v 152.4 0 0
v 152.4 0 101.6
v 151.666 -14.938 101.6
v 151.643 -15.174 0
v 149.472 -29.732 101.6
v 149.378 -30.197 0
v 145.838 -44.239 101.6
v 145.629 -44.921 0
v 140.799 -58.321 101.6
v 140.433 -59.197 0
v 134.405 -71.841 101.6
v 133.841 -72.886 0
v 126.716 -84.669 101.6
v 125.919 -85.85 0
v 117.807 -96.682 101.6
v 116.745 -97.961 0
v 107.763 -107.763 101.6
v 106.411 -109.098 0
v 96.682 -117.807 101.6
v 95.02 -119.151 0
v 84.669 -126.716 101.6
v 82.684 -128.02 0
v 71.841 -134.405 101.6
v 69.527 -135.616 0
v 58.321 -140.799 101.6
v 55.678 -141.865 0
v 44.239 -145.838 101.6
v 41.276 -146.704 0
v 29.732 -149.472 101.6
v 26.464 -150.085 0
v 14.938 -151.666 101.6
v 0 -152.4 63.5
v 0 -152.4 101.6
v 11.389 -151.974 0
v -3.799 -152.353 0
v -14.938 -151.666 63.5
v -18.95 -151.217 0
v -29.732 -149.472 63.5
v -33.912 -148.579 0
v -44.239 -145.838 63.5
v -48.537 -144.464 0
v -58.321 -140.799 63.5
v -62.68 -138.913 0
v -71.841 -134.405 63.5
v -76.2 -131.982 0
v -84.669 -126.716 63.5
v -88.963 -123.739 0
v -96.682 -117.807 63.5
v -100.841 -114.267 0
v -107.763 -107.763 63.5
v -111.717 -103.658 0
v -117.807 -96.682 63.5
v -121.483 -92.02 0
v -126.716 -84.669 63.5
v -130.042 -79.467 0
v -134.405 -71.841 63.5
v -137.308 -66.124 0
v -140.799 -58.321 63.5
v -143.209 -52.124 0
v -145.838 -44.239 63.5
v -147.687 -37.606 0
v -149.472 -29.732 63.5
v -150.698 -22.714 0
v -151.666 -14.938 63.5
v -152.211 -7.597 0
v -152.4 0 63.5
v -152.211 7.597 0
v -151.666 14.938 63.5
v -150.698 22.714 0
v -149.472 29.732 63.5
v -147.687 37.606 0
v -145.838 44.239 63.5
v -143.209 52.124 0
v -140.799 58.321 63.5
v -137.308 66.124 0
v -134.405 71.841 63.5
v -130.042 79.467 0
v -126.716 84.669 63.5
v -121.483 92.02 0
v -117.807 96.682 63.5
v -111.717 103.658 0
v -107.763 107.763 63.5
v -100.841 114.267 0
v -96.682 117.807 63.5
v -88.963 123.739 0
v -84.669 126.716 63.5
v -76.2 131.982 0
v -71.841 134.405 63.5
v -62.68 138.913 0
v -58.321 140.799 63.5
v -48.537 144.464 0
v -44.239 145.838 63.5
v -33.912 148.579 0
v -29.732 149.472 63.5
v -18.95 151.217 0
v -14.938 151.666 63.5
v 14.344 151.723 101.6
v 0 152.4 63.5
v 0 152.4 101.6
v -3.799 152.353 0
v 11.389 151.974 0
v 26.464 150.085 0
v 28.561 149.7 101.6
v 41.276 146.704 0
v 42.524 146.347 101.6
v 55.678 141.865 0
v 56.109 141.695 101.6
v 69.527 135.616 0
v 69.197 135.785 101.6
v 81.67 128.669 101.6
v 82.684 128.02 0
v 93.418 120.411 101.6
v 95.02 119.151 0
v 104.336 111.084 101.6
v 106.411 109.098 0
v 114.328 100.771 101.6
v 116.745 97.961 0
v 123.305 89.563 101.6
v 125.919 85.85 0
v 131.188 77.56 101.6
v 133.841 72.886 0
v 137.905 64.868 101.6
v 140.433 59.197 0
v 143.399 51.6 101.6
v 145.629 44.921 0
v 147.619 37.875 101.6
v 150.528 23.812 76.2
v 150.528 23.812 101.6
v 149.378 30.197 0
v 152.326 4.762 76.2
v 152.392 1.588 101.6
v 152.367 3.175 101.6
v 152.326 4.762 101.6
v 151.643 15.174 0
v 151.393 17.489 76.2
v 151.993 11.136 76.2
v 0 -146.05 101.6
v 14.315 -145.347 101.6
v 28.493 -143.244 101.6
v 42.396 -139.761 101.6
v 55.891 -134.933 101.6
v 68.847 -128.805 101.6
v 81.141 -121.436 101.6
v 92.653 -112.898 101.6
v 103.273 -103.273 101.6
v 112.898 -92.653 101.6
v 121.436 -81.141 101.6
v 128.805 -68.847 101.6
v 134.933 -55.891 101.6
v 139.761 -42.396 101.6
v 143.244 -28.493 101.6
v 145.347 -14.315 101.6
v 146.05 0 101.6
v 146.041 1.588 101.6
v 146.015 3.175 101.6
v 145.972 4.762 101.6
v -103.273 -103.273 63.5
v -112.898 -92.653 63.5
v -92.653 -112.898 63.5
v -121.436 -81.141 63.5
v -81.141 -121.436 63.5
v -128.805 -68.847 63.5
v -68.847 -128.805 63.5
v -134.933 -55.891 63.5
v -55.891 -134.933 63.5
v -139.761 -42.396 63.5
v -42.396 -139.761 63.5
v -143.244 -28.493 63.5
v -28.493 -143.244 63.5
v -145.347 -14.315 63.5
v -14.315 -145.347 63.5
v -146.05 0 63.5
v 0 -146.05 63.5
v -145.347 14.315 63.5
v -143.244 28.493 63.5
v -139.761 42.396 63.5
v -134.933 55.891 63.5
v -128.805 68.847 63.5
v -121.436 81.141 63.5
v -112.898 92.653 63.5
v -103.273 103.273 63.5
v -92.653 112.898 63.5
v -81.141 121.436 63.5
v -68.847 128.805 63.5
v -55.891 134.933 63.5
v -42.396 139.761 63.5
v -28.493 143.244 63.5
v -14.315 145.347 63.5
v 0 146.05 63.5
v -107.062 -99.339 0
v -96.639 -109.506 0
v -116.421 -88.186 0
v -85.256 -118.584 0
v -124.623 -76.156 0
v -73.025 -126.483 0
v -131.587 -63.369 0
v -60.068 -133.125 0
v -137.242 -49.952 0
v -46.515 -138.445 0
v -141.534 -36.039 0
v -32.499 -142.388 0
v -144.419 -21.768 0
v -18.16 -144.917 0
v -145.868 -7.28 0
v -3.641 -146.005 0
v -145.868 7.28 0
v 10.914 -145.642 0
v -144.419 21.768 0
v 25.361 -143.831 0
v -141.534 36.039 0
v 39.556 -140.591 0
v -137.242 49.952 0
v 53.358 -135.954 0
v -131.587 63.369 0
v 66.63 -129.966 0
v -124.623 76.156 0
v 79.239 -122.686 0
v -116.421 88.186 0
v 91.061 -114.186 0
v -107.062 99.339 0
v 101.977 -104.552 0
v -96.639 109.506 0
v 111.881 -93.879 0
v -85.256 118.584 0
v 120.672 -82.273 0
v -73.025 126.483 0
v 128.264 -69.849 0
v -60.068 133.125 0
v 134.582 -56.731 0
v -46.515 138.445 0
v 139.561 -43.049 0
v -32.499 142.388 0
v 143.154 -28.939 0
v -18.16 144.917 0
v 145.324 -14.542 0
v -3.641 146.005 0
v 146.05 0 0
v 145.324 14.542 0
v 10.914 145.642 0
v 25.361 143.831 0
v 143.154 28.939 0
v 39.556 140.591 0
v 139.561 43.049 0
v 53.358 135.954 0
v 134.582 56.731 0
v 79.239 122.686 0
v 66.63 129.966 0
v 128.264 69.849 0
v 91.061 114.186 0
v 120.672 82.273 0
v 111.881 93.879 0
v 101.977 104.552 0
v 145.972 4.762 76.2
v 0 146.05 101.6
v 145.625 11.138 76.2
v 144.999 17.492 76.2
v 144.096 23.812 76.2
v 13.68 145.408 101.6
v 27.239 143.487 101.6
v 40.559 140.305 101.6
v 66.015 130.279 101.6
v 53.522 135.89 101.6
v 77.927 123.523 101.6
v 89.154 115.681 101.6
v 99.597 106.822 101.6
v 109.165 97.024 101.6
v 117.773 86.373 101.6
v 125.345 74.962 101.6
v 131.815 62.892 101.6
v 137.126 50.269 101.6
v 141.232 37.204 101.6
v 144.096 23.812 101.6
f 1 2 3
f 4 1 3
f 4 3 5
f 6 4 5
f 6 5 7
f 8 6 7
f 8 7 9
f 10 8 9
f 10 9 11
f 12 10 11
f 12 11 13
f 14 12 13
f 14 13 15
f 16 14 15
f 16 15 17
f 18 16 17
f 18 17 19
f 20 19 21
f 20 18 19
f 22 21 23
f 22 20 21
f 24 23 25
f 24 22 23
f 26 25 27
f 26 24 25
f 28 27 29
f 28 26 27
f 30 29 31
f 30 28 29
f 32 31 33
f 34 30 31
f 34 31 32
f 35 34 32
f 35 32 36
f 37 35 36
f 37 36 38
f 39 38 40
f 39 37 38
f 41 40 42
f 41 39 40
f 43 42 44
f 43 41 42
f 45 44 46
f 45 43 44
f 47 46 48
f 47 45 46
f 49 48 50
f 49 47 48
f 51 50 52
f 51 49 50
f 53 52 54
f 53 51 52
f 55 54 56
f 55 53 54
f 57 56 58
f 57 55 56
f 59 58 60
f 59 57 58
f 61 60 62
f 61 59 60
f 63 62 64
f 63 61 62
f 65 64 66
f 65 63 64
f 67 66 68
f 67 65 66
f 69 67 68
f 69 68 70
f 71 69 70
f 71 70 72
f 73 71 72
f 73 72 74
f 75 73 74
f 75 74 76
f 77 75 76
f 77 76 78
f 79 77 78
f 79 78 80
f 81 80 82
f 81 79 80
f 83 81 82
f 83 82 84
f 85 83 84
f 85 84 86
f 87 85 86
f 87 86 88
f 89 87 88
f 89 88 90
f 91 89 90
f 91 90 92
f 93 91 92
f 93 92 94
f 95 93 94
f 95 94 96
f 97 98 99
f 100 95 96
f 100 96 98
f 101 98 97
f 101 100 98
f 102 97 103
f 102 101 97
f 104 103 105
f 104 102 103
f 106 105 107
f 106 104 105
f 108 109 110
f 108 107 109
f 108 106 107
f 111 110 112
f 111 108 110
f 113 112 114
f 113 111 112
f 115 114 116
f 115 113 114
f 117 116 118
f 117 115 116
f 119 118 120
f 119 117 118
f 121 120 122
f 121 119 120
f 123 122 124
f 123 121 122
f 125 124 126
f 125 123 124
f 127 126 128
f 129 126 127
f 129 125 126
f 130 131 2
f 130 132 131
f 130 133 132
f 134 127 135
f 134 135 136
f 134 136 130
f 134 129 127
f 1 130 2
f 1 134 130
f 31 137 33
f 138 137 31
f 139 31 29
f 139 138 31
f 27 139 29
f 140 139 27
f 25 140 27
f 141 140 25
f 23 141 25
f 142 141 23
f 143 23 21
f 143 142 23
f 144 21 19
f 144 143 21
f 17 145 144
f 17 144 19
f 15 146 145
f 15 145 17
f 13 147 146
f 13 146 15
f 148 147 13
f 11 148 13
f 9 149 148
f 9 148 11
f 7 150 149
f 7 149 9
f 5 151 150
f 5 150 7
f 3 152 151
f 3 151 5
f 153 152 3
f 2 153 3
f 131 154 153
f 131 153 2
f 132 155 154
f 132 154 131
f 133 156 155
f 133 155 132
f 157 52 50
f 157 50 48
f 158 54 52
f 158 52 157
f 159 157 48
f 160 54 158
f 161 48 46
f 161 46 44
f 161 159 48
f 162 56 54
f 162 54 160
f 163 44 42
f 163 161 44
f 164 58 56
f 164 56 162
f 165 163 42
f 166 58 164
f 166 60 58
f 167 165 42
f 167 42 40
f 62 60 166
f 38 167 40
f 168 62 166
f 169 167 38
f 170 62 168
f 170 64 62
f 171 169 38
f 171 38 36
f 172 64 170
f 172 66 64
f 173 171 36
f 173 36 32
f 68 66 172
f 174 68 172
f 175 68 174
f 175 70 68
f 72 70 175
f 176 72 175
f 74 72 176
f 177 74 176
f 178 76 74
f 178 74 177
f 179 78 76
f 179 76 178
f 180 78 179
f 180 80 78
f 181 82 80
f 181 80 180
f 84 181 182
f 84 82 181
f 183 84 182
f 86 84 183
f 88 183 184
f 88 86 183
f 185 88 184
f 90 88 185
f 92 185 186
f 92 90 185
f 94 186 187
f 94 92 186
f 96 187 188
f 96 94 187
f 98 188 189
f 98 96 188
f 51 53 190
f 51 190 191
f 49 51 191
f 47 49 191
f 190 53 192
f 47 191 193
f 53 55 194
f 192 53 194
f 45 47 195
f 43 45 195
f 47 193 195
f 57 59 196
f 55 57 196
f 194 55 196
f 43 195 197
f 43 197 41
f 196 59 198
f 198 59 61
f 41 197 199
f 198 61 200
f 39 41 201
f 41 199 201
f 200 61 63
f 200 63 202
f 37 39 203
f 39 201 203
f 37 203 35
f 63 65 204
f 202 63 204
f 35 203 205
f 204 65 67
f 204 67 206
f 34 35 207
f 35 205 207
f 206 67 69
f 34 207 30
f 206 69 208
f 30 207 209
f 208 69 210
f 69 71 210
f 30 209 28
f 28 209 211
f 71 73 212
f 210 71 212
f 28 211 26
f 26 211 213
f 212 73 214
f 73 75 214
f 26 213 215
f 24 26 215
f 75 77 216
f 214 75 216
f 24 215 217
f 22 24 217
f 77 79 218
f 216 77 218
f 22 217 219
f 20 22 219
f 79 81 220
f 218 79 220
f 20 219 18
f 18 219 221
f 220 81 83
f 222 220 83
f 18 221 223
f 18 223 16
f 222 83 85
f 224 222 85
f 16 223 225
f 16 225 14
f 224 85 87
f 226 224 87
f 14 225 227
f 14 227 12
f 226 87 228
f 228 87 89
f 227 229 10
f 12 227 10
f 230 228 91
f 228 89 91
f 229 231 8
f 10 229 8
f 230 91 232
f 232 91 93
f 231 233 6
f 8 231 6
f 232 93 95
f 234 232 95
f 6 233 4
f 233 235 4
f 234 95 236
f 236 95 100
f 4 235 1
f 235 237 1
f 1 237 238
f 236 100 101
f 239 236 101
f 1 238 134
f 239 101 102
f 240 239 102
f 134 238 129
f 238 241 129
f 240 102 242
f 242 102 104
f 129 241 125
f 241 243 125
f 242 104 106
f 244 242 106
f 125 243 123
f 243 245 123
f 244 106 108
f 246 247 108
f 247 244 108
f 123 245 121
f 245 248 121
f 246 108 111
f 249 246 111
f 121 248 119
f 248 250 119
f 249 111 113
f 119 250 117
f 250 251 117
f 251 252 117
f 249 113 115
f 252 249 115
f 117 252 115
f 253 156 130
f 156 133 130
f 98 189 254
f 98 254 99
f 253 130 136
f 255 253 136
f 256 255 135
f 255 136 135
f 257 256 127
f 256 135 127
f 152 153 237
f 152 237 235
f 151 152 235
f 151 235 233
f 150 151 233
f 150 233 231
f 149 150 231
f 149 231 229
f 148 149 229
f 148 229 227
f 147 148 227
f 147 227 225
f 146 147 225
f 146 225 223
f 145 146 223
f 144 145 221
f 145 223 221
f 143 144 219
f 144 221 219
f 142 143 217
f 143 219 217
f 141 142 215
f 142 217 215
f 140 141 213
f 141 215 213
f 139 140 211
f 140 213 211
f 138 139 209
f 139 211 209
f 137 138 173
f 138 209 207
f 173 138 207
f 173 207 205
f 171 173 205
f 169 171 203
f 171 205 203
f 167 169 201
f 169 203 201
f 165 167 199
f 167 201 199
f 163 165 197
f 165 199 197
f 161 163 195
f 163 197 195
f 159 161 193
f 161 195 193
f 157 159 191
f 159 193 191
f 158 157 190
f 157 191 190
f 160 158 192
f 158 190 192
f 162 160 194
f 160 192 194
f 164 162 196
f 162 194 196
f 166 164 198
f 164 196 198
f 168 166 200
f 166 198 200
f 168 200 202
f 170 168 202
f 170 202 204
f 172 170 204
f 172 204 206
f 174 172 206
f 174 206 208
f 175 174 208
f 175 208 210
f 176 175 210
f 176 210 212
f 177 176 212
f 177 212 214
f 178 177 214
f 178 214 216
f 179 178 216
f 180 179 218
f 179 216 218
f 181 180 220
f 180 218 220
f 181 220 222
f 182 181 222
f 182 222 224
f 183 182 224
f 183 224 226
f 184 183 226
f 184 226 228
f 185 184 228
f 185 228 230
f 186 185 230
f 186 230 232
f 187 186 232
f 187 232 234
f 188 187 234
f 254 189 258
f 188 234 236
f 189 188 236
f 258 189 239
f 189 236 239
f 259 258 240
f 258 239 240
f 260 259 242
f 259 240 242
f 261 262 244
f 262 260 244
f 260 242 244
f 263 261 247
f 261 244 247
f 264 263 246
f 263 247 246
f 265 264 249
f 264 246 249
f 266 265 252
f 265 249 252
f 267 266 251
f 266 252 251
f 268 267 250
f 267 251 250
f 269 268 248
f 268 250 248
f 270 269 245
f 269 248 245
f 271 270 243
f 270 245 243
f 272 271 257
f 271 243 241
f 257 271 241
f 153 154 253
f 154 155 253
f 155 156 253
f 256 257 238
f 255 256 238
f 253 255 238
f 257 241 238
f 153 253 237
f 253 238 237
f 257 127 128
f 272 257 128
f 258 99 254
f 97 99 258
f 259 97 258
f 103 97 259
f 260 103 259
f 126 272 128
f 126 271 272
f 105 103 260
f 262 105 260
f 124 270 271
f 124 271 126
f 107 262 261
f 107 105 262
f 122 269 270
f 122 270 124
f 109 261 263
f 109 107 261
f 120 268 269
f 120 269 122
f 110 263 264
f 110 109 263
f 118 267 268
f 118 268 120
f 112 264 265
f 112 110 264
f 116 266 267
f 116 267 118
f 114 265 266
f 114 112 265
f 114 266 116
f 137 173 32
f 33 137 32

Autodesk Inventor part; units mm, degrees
ref_plane "YZ Plane" through (0, 0, 0) normal (1, 0, 0) x (0, 1, 0)
ref_plane "XZ Plane" through (0, 0, 0) normal (0, 1, 0) x (-1, 0, 0)
ref_plane "XY Plane" through (0, 0, 0) normal (0, 0, 1) x (1, 0, 0)
sketch "Sketch1" plane through (0, 0, 0) normal (0, 0, 1) x (1, 0, 0)
  circle A0 centre (0, 0) radius 152.4
  circle A1 centre (0, 0) radius 146.05
  dimension "d0" = 304.8
  dimension "d1" = 292.1
extrude "Extrusion1" add sketch "Sketch1" along normal blind 101.6
sketch "Sketch2" plane through (0, 0, 101.6) normal (0, 0, 1) x (1, 0, 0)
  circle A0 centre (0, 0) radius 146.05 projected
  circle A1 centre (0, 0) radius 152.4 projected
  line L0 (0, -146.05) -> (0, -152.4)
  line L1 (0, 146.05) -> (0, 152.4)
extrude "Extrusion3" cut sketch "Sketch2" against normal blind 38.1 contours A0 L0 A1 L1 picked at (-148.0019, 0)
ref_plane "Work Plane1" through (152.4, 0, 0) normal (-1, 0, 0) x (0, -1, 0)
sketch "Sketch3" plane through (152.4, 0, 0) normal (-1, 0, 0) x (0, -1, 0)
  line L0 (-4.7625, 101.6) -> (-4.7625, 76.2)
  line L1 (-4.7625, 76.2) -> (-23.8125, 76.2)
  line L2 (-23.8125, 76.2) -> (-23.8125, 101.6)
  line L3 (-23.8125, 101.6) -> (-4.7625, 101.6)
  line L4 (-152.4, 0) -> (152.4, 0) projected
  point P0 (0, 0)
  dimension "d8" = 25.4
  dimension "d9" = 19.05
  dimension "d10" = 4.7625
  dimension "d11" = 101.6
extrude "Extrusion4" cut sketch "Sketch3" along normal blind 38.1
properties part number "Bucketr" material "Polycarbonate, Clear"
